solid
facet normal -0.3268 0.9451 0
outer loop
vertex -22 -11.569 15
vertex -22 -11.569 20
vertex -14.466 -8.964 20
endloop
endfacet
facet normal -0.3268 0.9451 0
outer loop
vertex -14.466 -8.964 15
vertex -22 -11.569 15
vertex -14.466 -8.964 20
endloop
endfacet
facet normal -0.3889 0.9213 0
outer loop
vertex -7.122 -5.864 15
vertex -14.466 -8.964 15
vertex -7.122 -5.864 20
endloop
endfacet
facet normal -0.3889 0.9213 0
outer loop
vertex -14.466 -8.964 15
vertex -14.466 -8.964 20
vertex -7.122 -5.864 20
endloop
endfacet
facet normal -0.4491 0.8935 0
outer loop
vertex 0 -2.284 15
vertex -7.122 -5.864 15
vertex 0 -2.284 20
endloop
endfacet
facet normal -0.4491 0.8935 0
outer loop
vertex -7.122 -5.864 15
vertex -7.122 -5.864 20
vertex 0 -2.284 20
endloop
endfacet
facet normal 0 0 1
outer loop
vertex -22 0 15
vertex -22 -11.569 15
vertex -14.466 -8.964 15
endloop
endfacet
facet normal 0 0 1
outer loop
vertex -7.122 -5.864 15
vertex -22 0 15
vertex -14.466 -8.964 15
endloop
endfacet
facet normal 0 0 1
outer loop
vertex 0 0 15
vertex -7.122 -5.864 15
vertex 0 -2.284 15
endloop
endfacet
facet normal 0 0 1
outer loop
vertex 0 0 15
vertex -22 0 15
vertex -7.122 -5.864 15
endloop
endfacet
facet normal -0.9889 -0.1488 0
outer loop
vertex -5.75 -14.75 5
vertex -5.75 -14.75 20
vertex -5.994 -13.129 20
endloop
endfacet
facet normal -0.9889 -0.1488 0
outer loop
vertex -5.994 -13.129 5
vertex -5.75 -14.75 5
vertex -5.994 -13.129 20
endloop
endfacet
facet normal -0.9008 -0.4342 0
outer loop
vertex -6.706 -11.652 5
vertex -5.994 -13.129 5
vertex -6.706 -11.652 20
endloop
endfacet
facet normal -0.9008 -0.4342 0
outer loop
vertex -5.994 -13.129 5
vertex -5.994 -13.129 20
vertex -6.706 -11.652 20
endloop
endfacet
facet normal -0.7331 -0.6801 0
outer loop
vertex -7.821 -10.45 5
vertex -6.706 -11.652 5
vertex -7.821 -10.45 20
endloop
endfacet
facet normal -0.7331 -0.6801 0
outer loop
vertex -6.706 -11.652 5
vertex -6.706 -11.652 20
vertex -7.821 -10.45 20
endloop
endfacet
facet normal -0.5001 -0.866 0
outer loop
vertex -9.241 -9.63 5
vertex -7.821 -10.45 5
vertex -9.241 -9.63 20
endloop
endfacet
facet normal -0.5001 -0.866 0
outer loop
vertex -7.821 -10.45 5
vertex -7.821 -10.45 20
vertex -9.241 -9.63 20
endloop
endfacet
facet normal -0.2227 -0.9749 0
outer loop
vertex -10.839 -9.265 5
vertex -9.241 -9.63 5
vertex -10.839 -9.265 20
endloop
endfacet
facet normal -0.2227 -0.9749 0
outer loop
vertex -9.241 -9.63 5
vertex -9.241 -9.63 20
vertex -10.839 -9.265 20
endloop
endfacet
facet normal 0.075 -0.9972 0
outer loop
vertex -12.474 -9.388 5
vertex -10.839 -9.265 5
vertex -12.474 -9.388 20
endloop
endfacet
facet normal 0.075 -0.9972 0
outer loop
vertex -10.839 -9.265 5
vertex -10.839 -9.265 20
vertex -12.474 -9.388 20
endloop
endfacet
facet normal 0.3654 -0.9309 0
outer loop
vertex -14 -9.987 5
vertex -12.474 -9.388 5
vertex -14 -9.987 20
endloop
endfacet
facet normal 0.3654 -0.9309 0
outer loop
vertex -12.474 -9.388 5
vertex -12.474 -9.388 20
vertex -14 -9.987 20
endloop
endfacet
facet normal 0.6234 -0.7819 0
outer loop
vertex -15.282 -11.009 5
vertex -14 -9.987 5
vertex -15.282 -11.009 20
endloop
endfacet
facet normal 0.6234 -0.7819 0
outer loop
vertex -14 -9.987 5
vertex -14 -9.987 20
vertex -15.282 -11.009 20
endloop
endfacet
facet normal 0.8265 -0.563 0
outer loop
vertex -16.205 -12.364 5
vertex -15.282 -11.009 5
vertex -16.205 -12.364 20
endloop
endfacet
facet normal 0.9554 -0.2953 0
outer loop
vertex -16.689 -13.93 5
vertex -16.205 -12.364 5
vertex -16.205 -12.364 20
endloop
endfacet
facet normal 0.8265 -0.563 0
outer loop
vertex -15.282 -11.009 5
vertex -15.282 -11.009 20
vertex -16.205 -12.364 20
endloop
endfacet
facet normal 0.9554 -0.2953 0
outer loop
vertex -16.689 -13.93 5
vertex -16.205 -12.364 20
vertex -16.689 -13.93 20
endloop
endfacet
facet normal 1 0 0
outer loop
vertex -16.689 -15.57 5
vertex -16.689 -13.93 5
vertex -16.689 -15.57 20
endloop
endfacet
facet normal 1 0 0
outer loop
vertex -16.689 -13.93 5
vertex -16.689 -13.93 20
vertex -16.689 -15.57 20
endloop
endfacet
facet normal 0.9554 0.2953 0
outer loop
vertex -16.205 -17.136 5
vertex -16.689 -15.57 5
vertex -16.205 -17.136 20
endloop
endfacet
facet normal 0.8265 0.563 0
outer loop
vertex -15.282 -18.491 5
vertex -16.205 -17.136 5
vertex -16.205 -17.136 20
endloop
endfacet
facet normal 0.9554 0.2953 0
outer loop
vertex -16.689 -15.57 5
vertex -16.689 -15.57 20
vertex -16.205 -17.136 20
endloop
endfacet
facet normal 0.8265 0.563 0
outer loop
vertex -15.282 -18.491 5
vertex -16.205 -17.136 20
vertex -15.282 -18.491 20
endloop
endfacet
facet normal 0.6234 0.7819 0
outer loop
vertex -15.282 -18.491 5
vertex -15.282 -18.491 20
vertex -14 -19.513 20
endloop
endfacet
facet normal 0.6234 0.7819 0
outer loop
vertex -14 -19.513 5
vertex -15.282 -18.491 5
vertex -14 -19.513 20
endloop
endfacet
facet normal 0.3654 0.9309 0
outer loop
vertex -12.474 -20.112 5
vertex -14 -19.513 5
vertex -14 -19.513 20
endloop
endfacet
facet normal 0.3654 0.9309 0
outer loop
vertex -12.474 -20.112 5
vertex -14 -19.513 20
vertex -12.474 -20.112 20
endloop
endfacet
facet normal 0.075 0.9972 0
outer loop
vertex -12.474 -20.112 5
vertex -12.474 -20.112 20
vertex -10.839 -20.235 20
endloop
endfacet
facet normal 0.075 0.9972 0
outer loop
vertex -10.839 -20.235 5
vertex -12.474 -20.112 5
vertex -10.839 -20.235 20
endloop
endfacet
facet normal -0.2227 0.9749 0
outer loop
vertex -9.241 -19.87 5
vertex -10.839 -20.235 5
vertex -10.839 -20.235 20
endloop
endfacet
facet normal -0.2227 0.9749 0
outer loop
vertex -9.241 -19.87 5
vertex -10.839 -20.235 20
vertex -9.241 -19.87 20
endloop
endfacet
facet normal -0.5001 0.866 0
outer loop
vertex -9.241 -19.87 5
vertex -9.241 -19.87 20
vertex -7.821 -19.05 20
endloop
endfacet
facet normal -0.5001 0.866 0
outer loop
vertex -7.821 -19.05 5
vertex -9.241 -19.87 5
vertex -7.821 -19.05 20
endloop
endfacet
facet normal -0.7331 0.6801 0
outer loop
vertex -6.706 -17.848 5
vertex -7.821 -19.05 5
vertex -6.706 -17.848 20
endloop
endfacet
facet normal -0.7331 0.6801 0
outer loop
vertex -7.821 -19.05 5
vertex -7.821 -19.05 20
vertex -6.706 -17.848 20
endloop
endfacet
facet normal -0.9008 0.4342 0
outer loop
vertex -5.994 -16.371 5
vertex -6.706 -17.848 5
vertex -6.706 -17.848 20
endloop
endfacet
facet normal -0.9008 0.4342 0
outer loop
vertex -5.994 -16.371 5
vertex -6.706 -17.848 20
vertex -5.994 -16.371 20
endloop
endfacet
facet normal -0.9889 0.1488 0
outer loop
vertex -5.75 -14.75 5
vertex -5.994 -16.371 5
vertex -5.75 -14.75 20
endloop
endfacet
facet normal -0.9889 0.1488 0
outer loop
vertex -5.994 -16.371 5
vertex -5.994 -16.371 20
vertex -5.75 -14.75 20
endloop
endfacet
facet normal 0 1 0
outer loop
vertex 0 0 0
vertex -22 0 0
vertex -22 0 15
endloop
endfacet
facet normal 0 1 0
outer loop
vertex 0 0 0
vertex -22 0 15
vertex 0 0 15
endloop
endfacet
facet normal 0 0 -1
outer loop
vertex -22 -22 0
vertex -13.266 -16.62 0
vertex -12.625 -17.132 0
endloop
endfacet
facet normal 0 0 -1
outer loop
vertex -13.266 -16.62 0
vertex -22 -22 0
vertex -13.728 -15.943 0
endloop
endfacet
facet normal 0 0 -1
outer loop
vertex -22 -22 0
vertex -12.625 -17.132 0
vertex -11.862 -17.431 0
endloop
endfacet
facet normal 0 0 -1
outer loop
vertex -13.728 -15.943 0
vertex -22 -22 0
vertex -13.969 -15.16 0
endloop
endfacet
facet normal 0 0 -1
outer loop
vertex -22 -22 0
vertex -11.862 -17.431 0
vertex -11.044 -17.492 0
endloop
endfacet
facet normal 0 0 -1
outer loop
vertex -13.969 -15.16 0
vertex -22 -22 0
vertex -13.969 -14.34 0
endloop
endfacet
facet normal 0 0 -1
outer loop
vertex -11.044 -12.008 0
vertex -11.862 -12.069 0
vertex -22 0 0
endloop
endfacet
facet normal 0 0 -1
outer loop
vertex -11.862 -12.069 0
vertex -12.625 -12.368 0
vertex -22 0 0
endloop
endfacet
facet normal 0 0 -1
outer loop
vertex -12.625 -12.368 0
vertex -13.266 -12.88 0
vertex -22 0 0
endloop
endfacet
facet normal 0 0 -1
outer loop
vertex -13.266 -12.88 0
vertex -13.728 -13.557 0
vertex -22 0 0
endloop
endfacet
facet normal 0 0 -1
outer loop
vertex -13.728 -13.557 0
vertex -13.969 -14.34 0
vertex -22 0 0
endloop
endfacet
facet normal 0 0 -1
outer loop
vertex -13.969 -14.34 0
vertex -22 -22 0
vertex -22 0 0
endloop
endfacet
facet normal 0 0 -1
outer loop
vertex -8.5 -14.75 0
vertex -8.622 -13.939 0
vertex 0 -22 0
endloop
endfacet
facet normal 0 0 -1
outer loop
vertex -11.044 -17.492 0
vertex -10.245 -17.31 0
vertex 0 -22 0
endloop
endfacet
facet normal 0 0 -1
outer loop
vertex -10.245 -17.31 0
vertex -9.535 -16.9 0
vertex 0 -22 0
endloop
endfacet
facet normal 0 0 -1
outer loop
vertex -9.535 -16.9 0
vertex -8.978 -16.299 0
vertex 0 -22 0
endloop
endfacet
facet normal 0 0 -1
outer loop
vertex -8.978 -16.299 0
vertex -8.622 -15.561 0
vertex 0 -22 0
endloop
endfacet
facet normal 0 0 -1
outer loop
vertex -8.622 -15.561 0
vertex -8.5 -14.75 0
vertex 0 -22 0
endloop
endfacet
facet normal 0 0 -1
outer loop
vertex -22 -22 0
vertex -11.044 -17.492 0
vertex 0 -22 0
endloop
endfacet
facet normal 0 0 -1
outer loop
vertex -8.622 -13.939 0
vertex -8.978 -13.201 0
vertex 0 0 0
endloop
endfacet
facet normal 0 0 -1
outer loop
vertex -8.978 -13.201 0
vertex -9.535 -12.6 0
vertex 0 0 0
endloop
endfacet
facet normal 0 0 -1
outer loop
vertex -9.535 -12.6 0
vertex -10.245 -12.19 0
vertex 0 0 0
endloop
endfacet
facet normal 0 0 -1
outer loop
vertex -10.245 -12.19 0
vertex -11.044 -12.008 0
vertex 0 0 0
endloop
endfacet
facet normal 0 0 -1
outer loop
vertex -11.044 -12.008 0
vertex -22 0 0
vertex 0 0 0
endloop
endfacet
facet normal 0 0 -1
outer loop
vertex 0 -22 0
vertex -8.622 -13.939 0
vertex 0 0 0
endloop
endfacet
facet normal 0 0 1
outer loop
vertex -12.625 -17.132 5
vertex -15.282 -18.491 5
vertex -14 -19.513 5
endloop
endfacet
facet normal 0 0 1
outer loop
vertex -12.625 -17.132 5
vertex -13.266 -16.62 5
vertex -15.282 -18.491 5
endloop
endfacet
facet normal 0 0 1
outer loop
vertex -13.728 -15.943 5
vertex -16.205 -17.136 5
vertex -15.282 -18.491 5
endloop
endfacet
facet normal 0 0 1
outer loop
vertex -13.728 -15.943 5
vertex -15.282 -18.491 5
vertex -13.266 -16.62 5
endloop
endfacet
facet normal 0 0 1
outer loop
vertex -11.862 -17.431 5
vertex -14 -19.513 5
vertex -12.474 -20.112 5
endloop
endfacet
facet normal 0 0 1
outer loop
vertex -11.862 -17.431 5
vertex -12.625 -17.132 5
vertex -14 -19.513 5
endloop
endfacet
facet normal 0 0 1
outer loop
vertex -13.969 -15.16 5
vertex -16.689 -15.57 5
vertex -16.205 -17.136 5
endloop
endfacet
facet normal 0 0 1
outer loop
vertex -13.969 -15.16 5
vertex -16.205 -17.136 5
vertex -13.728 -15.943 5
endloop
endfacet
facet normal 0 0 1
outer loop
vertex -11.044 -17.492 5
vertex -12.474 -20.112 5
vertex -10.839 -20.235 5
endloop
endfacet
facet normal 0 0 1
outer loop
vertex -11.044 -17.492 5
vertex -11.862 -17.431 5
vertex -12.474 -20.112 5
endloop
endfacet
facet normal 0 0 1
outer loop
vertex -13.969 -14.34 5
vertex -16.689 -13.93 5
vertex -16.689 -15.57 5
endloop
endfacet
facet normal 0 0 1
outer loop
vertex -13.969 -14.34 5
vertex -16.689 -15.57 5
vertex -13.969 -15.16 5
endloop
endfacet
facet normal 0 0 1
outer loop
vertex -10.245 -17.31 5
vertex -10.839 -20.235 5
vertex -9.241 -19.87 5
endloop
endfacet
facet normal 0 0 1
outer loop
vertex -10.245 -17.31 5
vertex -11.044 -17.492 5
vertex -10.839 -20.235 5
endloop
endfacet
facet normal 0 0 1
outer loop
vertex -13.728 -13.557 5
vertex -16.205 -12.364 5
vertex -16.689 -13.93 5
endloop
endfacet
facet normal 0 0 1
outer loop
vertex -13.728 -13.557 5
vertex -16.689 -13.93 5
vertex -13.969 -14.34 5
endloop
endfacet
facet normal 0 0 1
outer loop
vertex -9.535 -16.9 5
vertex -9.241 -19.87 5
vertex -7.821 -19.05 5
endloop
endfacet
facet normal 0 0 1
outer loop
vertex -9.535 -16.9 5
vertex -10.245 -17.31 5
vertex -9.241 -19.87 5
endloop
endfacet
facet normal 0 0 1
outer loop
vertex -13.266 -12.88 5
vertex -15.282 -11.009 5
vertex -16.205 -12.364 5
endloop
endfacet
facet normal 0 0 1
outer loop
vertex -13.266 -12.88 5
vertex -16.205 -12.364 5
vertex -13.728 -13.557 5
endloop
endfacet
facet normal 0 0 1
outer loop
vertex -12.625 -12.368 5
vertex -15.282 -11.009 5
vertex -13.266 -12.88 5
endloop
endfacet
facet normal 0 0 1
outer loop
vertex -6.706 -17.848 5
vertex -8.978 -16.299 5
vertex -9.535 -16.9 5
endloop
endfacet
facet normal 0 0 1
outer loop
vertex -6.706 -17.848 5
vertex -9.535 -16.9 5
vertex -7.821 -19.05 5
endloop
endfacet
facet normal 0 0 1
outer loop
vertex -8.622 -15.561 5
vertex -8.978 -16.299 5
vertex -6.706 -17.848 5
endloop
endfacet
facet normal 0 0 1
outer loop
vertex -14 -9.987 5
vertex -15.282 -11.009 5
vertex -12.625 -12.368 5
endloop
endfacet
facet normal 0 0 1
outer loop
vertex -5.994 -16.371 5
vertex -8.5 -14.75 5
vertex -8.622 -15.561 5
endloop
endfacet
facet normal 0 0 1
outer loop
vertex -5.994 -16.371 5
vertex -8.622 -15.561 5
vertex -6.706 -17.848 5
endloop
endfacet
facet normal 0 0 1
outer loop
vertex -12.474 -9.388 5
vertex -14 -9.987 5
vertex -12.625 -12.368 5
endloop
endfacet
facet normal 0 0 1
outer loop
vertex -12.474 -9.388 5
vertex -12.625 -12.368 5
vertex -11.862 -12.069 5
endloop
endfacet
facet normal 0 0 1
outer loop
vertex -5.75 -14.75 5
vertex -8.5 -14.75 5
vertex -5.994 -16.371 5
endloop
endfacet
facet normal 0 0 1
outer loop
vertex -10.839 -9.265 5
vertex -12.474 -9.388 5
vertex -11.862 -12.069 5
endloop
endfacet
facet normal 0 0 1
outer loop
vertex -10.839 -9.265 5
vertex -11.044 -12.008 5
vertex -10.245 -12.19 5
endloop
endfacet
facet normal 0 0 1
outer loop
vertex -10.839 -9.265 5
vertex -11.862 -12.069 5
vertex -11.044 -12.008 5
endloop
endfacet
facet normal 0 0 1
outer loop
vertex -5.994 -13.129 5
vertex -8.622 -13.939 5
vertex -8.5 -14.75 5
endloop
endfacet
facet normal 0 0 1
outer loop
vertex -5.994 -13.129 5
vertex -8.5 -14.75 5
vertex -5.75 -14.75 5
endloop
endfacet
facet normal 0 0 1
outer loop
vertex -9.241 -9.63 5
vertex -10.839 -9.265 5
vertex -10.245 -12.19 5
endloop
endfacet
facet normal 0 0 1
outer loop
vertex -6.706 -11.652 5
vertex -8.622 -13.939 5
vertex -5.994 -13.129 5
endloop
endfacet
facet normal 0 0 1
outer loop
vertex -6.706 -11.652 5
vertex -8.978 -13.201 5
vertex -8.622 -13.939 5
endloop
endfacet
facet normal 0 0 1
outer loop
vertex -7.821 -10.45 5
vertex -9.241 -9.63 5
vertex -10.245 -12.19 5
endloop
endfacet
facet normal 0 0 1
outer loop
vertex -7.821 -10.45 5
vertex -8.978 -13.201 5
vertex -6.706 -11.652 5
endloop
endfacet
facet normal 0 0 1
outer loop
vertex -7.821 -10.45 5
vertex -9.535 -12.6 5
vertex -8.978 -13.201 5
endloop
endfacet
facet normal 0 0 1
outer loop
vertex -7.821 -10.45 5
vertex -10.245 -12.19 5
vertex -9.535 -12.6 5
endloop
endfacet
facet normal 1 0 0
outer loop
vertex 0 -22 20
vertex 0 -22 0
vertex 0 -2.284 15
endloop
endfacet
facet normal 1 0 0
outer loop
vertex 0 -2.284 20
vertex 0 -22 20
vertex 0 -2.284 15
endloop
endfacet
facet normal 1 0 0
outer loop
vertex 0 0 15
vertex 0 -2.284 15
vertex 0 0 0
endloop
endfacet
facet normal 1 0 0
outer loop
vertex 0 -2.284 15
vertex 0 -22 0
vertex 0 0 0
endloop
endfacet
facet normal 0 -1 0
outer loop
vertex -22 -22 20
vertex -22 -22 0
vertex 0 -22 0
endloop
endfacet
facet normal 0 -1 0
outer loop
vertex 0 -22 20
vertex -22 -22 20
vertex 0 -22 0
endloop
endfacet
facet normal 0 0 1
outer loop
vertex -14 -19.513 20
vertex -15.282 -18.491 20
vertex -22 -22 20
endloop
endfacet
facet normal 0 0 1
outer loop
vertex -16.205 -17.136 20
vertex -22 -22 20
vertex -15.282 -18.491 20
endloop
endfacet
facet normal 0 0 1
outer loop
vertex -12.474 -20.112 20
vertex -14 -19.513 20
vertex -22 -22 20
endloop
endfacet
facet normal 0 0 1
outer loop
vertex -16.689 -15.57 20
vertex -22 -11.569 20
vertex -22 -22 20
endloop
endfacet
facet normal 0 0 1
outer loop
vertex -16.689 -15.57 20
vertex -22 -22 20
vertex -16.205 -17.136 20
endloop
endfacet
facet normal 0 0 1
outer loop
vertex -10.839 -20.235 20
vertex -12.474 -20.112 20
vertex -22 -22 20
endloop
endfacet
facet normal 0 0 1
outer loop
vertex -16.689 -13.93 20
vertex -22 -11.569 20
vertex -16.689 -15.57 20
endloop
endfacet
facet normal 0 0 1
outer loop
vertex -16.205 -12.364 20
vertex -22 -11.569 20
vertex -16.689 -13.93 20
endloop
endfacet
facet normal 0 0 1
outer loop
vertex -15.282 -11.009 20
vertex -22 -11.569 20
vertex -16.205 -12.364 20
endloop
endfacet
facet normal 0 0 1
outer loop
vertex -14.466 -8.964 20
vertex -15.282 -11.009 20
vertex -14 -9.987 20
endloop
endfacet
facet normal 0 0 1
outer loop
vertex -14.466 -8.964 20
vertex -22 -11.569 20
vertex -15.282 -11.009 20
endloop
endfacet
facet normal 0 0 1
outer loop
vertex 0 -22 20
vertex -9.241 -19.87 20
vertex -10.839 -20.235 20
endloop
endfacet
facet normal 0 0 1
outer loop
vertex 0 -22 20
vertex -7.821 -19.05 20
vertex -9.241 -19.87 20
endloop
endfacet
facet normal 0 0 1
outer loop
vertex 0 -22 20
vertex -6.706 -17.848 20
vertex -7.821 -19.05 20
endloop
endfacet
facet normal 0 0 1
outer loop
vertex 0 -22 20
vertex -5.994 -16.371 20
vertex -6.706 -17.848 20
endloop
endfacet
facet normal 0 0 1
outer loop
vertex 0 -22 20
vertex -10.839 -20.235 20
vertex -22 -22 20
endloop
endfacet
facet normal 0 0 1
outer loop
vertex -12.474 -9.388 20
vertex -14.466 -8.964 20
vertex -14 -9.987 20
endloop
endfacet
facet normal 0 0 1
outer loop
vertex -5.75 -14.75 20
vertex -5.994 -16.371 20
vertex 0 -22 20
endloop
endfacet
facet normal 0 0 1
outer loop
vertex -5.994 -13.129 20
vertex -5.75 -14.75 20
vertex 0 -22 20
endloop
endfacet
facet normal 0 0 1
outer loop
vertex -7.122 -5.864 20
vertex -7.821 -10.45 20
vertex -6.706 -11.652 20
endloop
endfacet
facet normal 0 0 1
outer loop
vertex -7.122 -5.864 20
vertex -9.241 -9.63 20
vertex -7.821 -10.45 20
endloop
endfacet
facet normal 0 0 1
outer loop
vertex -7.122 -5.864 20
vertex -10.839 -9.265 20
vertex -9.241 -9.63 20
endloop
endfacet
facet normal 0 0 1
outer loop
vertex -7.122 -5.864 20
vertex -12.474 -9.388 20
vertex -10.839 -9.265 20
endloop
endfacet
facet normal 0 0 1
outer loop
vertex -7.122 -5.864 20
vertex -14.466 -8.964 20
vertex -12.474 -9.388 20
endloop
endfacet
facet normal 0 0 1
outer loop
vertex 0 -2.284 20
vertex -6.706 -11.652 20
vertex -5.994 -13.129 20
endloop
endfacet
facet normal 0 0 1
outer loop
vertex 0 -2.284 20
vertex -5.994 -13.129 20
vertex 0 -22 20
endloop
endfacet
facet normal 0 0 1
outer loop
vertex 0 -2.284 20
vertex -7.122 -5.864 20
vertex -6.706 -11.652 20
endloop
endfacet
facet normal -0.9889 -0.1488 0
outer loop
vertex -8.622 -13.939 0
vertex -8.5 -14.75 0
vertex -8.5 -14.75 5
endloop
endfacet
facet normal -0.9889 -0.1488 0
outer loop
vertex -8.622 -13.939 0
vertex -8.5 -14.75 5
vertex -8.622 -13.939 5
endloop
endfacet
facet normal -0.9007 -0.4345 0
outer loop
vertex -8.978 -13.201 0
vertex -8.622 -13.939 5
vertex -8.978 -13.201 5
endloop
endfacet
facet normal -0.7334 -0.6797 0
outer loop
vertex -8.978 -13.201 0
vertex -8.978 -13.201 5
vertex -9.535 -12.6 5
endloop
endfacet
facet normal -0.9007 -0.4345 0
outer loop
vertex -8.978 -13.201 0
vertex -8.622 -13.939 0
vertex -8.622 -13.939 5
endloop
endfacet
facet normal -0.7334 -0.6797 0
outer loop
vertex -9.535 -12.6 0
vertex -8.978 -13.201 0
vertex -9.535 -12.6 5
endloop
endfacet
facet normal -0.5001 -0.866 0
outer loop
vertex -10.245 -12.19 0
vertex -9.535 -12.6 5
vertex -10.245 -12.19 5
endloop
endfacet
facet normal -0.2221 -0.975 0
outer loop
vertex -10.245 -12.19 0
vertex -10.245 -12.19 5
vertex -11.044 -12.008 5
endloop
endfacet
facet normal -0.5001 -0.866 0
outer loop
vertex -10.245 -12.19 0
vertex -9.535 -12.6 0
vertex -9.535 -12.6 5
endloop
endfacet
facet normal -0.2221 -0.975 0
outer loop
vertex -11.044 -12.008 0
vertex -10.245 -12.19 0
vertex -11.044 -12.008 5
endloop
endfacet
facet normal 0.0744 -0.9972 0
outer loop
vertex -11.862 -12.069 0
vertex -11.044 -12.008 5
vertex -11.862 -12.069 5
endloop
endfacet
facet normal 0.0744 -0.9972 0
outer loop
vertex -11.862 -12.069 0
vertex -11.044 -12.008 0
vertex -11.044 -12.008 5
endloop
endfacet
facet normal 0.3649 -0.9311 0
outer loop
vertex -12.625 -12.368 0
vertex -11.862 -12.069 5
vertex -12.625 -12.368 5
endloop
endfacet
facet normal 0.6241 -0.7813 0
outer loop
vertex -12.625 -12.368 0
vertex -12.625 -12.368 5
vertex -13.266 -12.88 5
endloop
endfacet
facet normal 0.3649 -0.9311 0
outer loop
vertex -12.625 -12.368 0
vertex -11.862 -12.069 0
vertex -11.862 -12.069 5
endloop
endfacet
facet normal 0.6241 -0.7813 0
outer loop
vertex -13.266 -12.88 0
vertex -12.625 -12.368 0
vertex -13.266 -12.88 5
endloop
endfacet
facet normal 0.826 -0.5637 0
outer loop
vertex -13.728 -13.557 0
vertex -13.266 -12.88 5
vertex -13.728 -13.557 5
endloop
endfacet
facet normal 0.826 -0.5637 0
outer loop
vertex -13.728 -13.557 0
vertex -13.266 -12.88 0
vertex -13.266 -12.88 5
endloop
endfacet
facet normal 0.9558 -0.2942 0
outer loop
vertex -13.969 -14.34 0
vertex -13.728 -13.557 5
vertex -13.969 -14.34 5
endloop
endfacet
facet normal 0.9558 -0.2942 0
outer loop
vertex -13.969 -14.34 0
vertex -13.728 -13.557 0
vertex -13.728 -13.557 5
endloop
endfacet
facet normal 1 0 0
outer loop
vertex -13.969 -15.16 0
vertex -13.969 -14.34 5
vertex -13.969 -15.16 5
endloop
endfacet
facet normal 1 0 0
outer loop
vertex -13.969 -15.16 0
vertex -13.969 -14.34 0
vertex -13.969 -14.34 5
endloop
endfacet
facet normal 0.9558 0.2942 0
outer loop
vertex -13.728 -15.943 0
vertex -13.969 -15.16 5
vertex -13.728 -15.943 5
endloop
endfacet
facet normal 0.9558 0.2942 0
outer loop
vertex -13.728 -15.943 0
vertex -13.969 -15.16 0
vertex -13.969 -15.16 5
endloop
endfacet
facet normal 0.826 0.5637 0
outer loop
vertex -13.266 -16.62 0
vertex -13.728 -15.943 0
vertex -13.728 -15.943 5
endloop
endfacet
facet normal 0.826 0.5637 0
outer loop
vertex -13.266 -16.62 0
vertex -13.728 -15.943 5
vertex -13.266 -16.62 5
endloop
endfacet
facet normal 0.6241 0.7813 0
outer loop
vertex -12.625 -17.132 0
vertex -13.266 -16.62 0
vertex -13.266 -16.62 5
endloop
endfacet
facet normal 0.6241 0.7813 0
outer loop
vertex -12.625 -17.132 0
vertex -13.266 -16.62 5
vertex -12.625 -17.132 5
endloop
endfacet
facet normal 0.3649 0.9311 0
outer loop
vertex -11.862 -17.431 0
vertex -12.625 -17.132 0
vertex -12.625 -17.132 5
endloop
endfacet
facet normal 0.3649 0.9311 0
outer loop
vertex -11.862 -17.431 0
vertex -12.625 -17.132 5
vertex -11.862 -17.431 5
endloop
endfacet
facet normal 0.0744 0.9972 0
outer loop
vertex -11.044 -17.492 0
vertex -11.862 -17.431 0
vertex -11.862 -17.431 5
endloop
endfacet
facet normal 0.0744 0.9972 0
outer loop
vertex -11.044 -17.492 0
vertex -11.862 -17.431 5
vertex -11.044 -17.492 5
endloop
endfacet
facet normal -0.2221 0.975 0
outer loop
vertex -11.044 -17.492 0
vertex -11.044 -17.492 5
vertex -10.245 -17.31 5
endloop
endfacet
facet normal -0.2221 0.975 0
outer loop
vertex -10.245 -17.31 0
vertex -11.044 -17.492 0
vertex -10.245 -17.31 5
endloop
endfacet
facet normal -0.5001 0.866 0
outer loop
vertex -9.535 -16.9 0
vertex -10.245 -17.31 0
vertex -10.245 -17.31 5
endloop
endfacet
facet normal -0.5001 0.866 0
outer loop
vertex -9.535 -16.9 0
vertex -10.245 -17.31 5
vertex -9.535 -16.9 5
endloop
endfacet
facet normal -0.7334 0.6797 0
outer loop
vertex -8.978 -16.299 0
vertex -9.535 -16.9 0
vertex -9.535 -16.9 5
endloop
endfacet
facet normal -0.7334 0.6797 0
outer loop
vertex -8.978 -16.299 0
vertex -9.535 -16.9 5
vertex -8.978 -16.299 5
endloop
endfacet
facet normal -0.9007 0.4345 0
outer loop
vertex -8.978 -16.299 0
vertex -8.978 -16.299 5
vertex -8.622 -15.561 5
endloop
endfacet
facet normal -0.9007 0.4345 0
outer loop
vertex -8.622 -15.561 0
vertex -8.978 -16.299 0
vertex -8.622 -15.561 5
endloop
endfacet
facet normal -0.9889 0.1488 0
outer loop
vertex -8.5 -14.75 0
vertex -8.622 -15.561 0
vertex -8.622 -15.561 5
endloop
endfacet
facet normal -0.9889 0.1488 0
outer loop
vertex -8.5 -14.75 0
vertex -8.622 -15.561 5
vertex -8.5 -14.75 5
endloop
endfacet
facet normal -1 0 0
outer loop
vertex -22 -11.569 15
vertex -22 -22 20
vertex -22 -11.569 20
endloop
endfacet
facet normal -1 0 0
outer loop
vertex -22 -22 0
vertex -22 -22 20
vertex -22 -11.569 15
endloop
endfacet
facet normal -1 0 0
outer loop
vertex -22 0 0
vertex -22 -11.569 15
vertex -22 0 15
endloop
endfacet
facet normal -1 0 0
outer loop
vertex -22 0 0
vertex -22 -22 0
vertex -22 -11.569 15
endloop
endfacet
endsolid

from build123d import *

# Parameters (mm, degrees)
F0_W     = 22
F0_H     = 22
F0_R     = 2.75
F1_DEPTH = 20
F2_R     = 5.5
F2_R_2   = 2.75
F3_DEPTH = 15
F5_DEPTH = 5


with BuildPart() as f1:
    # F0 (on Top) → F1 (new body)
    with BuildSketch(Plane.XY):
        with Locations((-11, -11)):
            Rectangle(F0_W, F0_H)
        with Locations((-11.25, -14.75)):
            Circle(F0_R, mode=Mode.SUBTRACT)
    extrude(amount=F1_DEPTH)

    # F2 (on face) → F3 (cut)
    with BuildSketch(Plane.XY.offset(20)):
        with Locations((-11.25, -14.75)):
            Circle(F2_R)
        with Locations((-11.25, -14.75)):
            Circle(F2_R_2, mode=Mode.SUBTRACT)
    extrude(amount=-F3_DEPTH, mode=Mode.SUBTRACT)

    # F4 (on face) → F5 (cut)
    with BuildSketch(Plane.XY.offset(20)):
        with BuildLine():
            Line((0, 0), (-22, 0))
            Line((-22, 0), (-22, -11.5693575736))
            ThreePointArc((-22, -11.5693575736), (-10.7684476262, -7.4750665799), (0, -2.2835809364))
            Line((0, -2.2835809364), (0, 0))
        make_face()
    extrude(amount=-F5_DEPTH, mode=Mode.SUBTRACT)


solid = f1.part
